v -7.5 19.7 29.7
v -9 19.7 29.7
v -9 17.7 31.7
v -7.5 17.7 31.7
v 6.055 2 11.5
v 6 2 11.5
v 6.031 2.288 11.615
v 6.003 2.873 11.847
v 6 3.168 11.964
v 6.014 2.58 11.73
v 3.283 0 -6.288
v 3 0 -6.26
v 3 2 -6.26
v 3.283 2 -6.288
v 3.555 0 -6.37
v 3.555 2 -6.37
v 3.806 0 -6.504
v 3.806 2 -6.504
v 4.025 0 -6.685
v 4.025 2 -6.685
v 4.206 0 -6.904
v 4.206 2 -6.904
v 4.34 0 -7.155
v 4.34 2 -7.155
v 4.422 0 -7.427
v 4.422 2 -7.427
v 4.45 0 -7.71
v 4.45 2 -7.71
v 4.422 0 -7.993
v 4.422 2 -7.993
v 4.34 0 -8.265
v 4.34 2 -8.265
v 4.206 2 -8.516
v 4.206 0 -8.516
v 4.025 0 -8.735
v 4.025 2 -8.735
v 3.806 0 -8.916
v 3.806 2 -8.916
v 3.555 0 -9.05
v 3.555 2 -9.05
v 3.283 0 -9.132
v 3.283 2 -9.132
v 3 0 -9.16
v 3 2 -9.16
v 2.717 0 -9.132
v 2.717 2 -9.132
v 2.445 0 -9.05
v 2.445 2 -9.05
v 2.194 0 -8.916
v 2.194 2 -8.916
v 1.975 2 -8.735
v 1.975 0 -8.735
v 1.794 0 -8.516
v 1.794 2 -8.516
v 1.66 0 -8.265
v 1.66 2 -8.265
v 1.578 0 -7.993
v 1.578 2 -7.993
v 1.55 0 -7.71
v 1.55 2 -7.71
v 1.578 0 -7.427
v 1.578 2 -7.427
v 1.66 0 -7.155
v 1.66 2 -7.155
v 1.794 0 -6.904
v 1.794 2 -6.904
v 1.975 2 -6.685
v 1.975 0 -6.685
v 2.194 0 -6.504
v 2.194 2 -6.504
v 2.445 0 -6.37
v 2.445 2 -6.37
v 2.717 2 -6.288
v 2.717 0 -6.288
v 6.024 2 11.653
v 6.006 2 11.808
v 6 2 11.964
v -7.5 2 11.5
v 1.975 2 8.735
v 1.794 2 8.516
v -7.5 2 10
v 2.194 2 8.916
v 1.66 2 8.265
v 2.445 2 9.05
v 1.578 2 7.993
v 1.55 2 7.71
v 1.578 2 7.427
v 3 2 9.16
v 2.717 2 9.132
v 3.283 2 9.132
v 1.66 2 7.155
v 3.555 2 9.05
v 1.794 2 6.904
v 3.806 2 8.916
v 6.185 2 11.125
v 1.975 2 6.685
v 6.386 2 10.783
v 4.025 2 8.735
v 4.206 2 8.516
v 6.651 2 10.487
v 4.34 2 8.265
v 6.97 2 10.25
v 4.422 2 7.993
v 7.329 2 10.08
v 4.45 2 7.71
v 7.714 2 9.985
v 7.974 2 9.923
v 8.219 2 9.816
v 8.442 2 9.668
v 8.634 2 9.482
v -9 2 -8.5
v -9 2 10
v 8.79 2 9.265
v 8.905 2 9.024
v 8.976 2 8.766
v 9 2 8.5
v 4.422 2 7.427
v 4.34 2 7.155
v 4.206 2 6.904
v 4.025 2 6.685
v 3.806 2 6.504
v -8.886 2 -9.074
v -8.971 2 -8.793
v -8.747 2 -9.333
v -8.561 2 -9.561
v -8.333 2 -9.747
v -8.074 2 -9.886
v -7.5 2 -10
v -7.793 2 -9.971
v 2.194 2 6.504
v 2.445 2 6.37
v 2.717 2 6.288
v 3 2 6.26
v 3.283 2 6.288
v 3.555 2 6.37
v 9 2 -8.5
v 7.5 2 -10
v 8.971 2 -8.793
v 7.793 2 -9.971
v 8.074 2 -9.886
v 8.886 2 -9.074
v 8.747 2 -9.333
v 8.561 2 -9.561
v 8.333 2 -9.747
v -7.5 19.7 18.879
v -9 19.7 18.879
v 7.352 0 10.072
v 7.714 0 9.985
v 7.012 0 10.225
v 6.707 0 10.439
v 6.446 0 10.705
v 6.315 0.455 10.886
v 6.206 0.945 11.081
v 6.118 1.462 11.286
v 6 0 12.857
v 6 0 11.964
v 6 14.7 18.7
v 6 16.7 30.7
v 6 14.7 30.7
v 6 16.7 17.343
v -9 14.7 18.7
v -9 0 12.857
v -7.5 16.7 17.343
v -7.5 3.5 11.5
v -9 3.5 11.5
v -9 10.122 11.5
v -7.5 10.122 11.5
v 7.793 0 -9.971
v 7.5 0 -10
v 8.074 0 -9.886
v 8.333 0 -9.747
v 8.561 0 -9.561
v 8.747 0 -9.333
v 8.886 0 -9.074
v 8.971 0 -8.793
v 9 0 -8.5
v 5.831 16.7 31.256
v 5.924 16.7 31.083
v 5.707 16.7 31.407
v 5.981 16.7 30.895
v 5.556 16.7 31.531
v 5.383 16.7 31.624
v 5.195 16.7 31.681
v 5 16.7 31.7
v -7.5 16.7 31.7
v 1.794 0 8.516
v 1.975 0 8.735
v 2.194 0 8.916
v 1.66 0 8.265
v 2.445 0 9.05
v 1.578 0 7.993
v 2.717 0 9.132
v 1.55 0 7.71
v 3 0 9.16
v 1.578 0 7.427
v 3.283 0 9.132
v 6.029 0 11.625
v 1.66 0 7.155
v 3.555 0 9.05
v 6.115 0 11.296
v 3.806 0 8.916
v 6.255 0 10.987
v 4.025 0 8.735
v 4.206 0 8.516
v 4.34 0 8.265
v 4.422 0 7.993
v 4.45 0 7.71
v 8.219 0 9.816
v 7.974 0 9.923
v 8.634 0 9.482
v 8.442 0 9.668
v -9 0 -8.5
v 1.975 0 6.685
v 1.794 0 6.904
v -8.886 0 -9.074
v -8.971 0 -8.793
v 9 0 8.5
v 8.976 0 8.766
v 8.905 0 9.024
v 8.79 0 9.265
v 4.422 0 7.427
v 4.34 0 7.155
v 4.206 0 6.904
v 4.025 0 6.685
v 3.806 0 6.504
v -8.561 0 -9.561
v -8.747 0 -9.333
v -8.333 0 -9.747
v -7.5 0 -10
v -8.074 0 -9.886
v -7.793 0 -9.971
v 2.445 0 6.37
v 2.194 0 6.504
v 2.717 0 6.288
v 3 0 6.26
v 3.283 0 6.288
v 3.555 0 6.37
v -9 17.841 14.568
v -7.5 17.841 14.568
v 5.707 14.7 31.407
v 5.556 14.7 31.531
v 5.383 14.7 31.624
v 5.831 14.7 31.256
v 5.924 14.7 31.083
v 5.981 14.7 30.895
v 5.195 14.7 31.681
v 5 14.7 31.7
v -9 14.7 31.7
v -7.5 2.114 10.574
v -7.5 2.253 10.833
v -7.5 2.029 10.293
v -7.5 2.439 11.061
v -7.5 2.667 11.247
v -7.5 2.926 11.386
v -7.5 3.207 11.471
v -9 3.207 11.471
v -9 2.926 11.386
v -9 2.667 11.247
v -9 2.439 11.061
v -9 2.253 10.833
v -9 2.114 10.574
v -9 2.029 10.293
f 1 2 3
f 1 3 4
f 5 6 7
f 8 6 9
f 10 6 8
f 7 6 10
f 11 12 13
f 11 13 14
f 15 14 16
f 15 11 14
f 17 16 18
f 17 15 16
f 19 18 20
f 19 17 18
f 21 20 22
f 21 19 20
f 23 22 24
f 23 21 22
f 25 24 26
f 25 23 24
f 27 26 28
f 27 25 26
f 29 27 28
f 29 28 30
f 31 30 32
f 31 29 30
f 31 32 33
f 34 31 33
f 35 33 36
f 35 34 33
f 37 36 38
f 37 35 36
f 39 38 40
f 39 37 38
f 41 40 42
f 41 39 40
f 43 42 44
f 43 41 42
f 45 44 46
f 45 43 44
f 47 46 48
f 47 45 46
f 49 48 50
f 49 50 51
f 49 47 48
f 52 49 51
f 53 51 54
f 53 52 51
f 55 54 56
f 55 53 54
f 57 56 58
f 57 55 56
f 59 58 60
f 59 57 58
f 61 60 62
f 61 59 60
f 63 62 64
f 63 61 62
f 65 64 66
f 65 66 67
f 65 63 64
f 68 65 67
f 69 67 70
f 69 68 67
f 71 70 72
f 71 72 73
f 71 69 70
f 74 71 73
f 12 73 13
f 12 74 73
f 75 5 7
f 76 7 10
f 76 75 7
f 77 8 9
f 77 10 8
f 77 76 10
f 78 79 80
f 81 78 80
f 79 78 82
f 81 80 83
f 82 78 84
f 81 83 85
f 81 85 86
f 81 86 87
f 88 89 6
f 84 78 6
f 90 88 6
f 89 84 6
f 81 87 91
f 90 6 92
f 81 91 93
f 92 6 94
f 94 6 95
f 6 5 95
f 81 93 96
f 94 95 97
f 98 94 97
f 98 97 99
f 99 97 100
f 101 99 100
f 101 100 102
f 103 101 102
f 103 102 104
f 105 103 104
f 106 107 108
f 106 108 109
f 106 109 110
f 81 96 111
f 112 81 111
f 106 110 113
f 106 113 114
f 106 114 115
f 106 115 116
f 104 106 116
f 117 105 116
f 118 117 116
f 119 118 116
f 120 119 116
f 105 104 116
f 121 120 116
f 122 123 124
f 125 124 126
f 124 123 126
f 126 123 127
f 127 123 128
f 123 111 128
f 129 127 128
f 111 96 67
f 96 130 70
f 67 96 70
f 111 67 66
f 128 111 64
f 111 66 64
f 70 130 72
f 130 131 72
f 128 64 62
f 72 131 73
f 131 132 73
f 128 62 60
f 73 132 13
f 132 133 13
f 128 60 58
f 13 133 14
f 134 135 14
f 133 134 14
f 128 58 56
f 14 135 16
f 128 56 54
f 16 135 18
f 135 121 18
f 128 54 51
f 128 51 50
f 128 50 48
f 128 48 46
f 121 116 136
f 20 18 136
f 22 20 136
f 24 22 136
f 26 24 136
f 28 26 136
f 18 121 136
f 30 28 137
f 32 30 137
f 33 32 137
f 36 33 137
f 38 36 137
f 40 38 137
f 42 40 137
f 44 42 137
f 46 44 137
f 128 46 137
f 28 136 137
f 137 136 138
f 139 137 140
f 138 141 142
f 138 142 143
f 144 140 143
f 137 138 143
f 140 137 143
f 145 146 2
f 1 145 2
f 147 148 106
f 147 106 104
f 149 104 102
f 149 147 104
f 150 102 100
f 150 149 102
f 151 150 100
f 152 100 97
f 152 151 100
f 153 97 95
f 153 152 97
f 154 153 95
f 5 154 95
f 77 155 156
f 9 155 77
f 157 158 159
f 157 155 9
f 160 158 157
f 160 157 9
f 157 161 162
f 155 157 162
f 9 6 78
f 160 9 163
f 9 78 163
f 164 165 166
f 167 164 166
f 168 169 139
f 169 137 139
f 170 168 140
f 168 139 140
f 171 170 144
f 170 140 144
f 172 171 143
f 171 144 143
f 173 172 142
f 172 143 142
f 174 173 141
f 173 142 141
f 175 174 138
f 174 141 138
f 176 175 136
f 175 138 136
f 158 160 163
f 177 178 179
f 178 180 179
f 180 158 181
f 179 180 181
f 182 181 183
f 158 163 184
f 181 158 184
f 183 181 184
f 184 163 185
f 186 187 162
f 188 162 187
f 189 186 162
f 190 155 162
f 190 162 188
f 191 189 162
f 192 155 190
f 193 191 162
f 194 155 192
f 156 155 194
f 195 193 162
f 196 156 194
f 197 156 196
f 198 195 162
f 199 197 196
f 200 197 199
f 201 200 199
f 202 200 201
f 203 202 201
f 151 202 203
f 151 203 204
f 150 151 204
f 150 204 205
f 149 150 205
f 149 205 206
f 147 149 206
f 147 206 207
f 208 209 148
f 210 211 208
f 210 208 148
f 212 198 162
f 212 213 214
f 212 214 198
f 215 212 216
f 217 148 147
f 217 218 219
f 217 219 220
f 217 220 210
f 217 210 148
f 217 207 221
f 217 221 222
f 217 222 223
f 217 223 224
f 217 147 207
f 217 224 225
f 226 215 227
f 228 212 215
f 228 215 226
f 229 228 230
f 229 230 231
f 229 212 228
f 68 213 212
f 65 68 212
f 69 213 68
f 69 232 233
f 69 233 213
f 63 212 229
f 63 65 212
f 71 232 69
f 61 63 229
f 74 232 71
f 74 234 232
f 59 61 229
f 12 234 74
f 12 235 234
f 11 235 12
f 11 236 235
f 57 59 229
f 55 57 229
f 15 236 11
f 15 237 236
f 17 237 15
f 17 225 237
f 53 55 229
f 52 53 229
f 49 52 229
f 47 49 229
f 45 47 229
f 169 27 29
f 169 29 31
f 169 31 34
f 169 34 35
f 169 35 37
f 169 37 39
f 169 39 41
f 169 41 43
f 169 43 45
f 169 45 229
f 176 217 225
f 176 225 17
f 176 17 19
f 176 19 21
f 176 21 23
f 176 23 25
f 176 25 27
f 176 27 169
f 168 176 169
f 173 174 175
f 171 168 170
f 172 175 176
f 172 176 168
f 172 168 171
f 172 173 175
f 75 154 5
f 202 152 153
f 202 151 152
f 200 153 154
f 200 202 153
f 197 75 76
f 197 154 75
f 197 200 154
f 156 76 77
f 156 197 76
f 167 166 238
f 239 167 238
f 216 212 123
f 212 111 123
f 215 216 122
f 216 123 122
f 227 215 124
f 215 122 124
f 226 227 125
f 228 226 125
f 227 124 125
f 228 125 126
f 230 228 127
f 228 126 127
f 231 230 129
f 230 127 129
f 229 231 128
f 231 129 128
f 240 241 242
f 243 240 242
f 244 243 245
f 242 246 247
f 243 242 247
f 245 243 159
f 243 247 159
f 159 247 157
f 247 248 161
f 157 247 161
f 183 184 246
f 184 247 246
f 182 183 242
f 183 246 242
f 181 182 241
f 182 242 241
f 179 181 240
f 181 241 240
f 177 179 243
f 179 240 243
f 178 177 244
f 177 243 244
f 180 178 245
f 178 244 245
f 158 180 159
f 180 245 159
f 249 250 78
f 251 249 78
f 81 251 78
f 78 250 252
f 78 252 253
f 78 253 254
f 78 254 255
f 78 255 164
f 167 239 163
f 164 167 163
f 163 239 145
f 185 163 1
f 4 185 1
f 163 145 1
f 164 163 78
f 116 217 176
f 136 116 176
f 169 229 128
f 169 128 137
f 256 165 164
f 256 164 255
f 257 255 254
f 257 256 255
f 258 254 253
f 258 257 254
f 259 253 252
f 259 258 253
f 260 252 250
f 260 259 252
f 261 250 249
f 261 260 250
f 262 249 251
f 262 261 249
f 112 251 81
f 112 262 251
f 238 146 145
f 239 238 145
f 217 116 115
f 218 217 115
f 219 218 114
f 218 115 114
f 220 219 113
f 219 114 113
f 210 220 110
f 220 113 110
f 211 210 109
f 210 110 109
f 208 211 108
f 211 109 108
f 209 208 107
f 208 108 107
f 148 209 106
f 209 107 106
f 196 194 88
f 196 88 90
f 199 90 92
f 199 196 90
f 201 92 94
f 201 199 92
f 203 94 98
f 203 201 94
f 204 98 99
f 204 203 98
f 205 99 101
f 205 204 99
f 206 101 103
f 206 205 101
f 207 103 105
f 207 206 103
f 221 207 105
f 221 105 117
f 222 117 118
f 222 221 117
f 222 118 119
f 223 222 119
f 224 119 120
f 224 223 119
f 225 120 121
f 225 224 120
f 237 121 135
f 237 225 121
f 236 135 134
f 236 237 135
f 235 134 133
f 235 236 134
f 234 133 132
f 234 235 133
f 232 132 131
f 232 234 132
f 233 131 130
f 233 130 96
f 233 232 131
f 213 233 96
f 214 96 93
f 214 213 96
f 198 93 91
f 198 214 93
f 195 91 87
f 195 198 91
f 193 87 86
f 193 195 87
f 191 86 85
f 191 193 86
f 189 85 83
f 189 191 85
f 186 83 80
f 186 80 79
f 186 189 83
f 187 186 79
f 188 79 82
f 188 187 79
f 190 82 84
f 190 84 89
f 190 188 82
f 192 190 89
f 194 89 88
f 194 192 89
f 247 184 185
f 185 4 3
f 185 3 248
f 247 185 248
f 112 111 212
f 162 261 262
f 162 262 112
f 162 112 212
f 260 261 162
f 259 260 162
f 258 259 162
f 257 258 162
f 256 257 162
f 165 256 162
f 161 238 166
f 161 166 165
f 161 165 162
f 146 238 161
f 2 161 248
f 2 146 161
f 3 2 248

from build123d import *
from OCP.BRepFilletAPI import BRepFilletAPI_MakeChamfer

# Parameters (mm, degrees)
SKETCH1_W           = 18
SKETCH1_H           = 20
SKETCH1_R           = 1.45
BOSS_EXTRUDE1_DEPTH = 2
BOSS_EXTRUDE2_DEPTH = 15
BOSS_EXTRUDE4_DEPTH = 1.5
CHAMFER1_SIZE       = 2
CHAMFER1_SIZE2      = 3.571892366
FILLET1_R           = 1.5
FILLET2_R           = 1
FILLET3_R           = 2
FILLET_2_DEPTH      = 1.5


with BuildPart() as part:
    # Sketch1 → Boss-Extrude1 (new body)
    with BuildSketch(Plane(origin=(0, 0, 0), x_dir=(1, 0, 0), z_dir=(0, 1, 0))):
        Rectangle(SKETCH1_W, SKETCH1_H)
        with Locations(Location((3, 7.71, 0), (0, 0, 270))):
            Circle(SKETCH1_R, mode=Mode.SUBTRACT)
        with Locations(Location((3, -7.71, 0), (0, 0, 270))):
            Circle(SKETCH1_R, mode=Mode.SUBTRACT)
    extrude(amount=BOSS_EXTRUDE1_DEPTH)

    # Sketch2 → Boss-Extrude2 (add)
    with BuildSketch(Plane.ZY.offset(9)):
        Polygon((10, 2), (11.5, 2), (17.342742479, 16.7), (31.7, 16.7), (31.7, 14.7), (18.7, 14.7), (12.857257521, 0), (10, 0), align=None)
    extrude(amount=-BOSS_EXTRUDE2_DEPTH)

    # Sketch4 → Boss-Extrude4 (add)
    with BuildSketch(Plane.ZY.offset(9)):
        Polygon((31.7, 16.7), (17.342742479, 16.7), (11.5, 2), (11.5, 10.122171388), (15.306856196, 19.7), (31.7, 19.7), align=None)
    extrude(amount=-BOSS_EXTRUDE4_DEPTH)

    # Chamfer1: one chamfer whose edges measure the first distance from different faces: ONE call of the kernel's chamfer builder (chamfer() names one face for all edges)
    chamfer1_edges_1 = [part.edges().sort_by_distance(p)[0] for p in [
        (-8.25, 19.7, 31.7),
    ]]
    chamfer1_edges_2 = [part.edges().sort_by_distance(p)[0] for p in [
        (-8.25, 19.7, 15.306856196),
    ]]
    chamfer1_side_2 = [part.faces().sort_by_distance(p)[0] for p in [
        (-8.25, 14.911085694, 13.403428098),
    ]]
    chamfer1 = BRepFilletAPI_MakeChamfer(part.part.solid().wrapped)
    for e in chamfer1_edges_1:
        chamfer1.Add(CHAMFER1_SIZE, e.wrapped)
    for e in chamfer1_edges_2:
        chamfer1.Add(CHAMFER1_SIZE, CHAMFER1_SIZE2, e.wrapped, chamfer1_side_2[0].wrapped)  # the first distance lies on this face
    add(Compound.cast(chamfer1.Shape()), mode=Mode.REPLACE)

    # Fillet1
    fillet1_edges = [part.edges().sort_by_distance(p)[0] for p in [
        (-9, 1, -10),
        (9, 1, -10),
        (9, 1, 10),
    ]]
    fillet(fillet1_edges, radius=FILLET1_R)

    # Fillet2
    fillet2_edges = [part.edges().sort_by_distance(p)[0] for p in [
        (6, 15.7, 31.7),
    ]]
    fillet(fillet2_edges, radius=FILLET2_R)

    # Fillet3
    # the kernel refuses this fillet: 2 mm, written as the material it adds along each edge
    with BuildSketch(Plane(origin=(6, 0, 10), x_dir=(0, 0, 1), z_dir=(0, 1, 0))) as fillet3_piece_1_section:
        with BuildLine():
            CenterArc((1.964101615, 2), FILLET3_R, 188.213210702, 81.786789298)
            Line((-0.015385022, 1.714285714), (-0.213333686, 1.685714286))
            ThreePointArc((-0.213333686, 1.685714286), (-0.2, 1.5), (-0.2, 0))
            Line((-0.2, 0), (0, -0.2))
            Line((0, -0.2), (1.964101615, -0.2))
            Line((1.964101615, -0.2), (1.964101615, 0))
        make_face()
    fillet3_piece_1 = extrude(amount=2, mode=Mode.PRIVATE)
    fillet3_piece_1 = split(fillet3_piece_1, bisect_by=Plane(origin=(5.952622656, 0.913834891, 11.068286869), z_dir=(0, -0.3693593568576952, 0.929286643346212)), keep=Keep.TOP, mode=Mode.PRIVATE)
    add(fillet3_piece_1)
    with BuildSketch(Plane(origin=(6, 0, 10), x_dir=(0, 0, 1), z_dir=(0, 1, 0))) as fillet3_piece_2_section:
        with BuildLine():
            CenterArc((1.964101615, 2), FILLET3_R, 188.213210702, 81.786789298)
            Line((-0.015385022, 1.714285714), (-0.213333686, 1.685714286))
            ThreePointArc((-0.213333686, 1.685714286), (-0.2, 1.5), (-0.2, 0))
            Line((-0.2, 0), (0, -0.2))
            Line((0, -0.2), (1.964101615, -0.2))
            Line((1.964101615, -0.2), (1.964101615, 0))
        make_face()
    fillet3_piece_2 = extrude(amount=2, mode=Mode.PRIVATE)
    fillet3_piece_2 = split(fillet3_piece_2, bisect_by=Plane(origin=(6.444718366, 0.756232919, 11.005645527), z_dir=(0, 0.3693593568576952, -0.929286643346212)), keep=Keep.TOP, mode=Mode.PRIVATE)
    add(fillet3_piece_2)
    with BuildSketch(Plane(origin=(6, 0, 10), x_dir=(0, 0, 1), z_dir=(0, 1, 0))) as fillet3_piece_3_section:
        with BuildLine():
            CenterArc((1.964101615, 2), FILLET3_R, 188.213210702, 81.786789298)
            Line((-0.015385022, 1.714285714), (-0.213333686, 1.685714286))
            ThreePointArc((-0.213333686, 1.685714286), (-0.2, 1.5), (-0.2, 0))
            Line((-0.2, 0), (0, -0.2))
            Line((0, -0.2), (1.964101615, -0.2))
            Line((1.964101615, -0.2), (1.964101615, 0))
        make_face()
    fillet3_piece_3 = extrude(amount=6.910254038, mode=Mode.PRIVATE)
    fillet3_piece_3 = split(fillet3_piece_3, bisect_by=Plane(origin=(5.904786251, 2.434661137, 11.672762795), z_dir=(0, -0.3693593568576952, 0.929286643346212)), keep=Keep.TOP, mode=Mode.PRIVATE)
    fillet3_piece_3 = split(fillet3_piece_3, bisect_by=Plane(origin=(5.904786251, 2, 11.804045744), z_dir=(0, 1, 0)), keep=Keep.TOP, mode=Mode.PRIVATE)
    add(fillet3_piece_3)

    # Sketch5 → Fillet 2 (add)
    with BuildSketch(Plane.ZY.offset(9)):
        with BuildLine():
            Line((10, 2), (11.5, 2))
            Line((11.5, 2), (11.5, 3.5))
            ThreePointArc((11.5, 3.5), (11.060660172, 2.439339828), (10, 2))
        make_face()
    extrude(amount=-FILLET_2_DEPTH)


solid = part.part
